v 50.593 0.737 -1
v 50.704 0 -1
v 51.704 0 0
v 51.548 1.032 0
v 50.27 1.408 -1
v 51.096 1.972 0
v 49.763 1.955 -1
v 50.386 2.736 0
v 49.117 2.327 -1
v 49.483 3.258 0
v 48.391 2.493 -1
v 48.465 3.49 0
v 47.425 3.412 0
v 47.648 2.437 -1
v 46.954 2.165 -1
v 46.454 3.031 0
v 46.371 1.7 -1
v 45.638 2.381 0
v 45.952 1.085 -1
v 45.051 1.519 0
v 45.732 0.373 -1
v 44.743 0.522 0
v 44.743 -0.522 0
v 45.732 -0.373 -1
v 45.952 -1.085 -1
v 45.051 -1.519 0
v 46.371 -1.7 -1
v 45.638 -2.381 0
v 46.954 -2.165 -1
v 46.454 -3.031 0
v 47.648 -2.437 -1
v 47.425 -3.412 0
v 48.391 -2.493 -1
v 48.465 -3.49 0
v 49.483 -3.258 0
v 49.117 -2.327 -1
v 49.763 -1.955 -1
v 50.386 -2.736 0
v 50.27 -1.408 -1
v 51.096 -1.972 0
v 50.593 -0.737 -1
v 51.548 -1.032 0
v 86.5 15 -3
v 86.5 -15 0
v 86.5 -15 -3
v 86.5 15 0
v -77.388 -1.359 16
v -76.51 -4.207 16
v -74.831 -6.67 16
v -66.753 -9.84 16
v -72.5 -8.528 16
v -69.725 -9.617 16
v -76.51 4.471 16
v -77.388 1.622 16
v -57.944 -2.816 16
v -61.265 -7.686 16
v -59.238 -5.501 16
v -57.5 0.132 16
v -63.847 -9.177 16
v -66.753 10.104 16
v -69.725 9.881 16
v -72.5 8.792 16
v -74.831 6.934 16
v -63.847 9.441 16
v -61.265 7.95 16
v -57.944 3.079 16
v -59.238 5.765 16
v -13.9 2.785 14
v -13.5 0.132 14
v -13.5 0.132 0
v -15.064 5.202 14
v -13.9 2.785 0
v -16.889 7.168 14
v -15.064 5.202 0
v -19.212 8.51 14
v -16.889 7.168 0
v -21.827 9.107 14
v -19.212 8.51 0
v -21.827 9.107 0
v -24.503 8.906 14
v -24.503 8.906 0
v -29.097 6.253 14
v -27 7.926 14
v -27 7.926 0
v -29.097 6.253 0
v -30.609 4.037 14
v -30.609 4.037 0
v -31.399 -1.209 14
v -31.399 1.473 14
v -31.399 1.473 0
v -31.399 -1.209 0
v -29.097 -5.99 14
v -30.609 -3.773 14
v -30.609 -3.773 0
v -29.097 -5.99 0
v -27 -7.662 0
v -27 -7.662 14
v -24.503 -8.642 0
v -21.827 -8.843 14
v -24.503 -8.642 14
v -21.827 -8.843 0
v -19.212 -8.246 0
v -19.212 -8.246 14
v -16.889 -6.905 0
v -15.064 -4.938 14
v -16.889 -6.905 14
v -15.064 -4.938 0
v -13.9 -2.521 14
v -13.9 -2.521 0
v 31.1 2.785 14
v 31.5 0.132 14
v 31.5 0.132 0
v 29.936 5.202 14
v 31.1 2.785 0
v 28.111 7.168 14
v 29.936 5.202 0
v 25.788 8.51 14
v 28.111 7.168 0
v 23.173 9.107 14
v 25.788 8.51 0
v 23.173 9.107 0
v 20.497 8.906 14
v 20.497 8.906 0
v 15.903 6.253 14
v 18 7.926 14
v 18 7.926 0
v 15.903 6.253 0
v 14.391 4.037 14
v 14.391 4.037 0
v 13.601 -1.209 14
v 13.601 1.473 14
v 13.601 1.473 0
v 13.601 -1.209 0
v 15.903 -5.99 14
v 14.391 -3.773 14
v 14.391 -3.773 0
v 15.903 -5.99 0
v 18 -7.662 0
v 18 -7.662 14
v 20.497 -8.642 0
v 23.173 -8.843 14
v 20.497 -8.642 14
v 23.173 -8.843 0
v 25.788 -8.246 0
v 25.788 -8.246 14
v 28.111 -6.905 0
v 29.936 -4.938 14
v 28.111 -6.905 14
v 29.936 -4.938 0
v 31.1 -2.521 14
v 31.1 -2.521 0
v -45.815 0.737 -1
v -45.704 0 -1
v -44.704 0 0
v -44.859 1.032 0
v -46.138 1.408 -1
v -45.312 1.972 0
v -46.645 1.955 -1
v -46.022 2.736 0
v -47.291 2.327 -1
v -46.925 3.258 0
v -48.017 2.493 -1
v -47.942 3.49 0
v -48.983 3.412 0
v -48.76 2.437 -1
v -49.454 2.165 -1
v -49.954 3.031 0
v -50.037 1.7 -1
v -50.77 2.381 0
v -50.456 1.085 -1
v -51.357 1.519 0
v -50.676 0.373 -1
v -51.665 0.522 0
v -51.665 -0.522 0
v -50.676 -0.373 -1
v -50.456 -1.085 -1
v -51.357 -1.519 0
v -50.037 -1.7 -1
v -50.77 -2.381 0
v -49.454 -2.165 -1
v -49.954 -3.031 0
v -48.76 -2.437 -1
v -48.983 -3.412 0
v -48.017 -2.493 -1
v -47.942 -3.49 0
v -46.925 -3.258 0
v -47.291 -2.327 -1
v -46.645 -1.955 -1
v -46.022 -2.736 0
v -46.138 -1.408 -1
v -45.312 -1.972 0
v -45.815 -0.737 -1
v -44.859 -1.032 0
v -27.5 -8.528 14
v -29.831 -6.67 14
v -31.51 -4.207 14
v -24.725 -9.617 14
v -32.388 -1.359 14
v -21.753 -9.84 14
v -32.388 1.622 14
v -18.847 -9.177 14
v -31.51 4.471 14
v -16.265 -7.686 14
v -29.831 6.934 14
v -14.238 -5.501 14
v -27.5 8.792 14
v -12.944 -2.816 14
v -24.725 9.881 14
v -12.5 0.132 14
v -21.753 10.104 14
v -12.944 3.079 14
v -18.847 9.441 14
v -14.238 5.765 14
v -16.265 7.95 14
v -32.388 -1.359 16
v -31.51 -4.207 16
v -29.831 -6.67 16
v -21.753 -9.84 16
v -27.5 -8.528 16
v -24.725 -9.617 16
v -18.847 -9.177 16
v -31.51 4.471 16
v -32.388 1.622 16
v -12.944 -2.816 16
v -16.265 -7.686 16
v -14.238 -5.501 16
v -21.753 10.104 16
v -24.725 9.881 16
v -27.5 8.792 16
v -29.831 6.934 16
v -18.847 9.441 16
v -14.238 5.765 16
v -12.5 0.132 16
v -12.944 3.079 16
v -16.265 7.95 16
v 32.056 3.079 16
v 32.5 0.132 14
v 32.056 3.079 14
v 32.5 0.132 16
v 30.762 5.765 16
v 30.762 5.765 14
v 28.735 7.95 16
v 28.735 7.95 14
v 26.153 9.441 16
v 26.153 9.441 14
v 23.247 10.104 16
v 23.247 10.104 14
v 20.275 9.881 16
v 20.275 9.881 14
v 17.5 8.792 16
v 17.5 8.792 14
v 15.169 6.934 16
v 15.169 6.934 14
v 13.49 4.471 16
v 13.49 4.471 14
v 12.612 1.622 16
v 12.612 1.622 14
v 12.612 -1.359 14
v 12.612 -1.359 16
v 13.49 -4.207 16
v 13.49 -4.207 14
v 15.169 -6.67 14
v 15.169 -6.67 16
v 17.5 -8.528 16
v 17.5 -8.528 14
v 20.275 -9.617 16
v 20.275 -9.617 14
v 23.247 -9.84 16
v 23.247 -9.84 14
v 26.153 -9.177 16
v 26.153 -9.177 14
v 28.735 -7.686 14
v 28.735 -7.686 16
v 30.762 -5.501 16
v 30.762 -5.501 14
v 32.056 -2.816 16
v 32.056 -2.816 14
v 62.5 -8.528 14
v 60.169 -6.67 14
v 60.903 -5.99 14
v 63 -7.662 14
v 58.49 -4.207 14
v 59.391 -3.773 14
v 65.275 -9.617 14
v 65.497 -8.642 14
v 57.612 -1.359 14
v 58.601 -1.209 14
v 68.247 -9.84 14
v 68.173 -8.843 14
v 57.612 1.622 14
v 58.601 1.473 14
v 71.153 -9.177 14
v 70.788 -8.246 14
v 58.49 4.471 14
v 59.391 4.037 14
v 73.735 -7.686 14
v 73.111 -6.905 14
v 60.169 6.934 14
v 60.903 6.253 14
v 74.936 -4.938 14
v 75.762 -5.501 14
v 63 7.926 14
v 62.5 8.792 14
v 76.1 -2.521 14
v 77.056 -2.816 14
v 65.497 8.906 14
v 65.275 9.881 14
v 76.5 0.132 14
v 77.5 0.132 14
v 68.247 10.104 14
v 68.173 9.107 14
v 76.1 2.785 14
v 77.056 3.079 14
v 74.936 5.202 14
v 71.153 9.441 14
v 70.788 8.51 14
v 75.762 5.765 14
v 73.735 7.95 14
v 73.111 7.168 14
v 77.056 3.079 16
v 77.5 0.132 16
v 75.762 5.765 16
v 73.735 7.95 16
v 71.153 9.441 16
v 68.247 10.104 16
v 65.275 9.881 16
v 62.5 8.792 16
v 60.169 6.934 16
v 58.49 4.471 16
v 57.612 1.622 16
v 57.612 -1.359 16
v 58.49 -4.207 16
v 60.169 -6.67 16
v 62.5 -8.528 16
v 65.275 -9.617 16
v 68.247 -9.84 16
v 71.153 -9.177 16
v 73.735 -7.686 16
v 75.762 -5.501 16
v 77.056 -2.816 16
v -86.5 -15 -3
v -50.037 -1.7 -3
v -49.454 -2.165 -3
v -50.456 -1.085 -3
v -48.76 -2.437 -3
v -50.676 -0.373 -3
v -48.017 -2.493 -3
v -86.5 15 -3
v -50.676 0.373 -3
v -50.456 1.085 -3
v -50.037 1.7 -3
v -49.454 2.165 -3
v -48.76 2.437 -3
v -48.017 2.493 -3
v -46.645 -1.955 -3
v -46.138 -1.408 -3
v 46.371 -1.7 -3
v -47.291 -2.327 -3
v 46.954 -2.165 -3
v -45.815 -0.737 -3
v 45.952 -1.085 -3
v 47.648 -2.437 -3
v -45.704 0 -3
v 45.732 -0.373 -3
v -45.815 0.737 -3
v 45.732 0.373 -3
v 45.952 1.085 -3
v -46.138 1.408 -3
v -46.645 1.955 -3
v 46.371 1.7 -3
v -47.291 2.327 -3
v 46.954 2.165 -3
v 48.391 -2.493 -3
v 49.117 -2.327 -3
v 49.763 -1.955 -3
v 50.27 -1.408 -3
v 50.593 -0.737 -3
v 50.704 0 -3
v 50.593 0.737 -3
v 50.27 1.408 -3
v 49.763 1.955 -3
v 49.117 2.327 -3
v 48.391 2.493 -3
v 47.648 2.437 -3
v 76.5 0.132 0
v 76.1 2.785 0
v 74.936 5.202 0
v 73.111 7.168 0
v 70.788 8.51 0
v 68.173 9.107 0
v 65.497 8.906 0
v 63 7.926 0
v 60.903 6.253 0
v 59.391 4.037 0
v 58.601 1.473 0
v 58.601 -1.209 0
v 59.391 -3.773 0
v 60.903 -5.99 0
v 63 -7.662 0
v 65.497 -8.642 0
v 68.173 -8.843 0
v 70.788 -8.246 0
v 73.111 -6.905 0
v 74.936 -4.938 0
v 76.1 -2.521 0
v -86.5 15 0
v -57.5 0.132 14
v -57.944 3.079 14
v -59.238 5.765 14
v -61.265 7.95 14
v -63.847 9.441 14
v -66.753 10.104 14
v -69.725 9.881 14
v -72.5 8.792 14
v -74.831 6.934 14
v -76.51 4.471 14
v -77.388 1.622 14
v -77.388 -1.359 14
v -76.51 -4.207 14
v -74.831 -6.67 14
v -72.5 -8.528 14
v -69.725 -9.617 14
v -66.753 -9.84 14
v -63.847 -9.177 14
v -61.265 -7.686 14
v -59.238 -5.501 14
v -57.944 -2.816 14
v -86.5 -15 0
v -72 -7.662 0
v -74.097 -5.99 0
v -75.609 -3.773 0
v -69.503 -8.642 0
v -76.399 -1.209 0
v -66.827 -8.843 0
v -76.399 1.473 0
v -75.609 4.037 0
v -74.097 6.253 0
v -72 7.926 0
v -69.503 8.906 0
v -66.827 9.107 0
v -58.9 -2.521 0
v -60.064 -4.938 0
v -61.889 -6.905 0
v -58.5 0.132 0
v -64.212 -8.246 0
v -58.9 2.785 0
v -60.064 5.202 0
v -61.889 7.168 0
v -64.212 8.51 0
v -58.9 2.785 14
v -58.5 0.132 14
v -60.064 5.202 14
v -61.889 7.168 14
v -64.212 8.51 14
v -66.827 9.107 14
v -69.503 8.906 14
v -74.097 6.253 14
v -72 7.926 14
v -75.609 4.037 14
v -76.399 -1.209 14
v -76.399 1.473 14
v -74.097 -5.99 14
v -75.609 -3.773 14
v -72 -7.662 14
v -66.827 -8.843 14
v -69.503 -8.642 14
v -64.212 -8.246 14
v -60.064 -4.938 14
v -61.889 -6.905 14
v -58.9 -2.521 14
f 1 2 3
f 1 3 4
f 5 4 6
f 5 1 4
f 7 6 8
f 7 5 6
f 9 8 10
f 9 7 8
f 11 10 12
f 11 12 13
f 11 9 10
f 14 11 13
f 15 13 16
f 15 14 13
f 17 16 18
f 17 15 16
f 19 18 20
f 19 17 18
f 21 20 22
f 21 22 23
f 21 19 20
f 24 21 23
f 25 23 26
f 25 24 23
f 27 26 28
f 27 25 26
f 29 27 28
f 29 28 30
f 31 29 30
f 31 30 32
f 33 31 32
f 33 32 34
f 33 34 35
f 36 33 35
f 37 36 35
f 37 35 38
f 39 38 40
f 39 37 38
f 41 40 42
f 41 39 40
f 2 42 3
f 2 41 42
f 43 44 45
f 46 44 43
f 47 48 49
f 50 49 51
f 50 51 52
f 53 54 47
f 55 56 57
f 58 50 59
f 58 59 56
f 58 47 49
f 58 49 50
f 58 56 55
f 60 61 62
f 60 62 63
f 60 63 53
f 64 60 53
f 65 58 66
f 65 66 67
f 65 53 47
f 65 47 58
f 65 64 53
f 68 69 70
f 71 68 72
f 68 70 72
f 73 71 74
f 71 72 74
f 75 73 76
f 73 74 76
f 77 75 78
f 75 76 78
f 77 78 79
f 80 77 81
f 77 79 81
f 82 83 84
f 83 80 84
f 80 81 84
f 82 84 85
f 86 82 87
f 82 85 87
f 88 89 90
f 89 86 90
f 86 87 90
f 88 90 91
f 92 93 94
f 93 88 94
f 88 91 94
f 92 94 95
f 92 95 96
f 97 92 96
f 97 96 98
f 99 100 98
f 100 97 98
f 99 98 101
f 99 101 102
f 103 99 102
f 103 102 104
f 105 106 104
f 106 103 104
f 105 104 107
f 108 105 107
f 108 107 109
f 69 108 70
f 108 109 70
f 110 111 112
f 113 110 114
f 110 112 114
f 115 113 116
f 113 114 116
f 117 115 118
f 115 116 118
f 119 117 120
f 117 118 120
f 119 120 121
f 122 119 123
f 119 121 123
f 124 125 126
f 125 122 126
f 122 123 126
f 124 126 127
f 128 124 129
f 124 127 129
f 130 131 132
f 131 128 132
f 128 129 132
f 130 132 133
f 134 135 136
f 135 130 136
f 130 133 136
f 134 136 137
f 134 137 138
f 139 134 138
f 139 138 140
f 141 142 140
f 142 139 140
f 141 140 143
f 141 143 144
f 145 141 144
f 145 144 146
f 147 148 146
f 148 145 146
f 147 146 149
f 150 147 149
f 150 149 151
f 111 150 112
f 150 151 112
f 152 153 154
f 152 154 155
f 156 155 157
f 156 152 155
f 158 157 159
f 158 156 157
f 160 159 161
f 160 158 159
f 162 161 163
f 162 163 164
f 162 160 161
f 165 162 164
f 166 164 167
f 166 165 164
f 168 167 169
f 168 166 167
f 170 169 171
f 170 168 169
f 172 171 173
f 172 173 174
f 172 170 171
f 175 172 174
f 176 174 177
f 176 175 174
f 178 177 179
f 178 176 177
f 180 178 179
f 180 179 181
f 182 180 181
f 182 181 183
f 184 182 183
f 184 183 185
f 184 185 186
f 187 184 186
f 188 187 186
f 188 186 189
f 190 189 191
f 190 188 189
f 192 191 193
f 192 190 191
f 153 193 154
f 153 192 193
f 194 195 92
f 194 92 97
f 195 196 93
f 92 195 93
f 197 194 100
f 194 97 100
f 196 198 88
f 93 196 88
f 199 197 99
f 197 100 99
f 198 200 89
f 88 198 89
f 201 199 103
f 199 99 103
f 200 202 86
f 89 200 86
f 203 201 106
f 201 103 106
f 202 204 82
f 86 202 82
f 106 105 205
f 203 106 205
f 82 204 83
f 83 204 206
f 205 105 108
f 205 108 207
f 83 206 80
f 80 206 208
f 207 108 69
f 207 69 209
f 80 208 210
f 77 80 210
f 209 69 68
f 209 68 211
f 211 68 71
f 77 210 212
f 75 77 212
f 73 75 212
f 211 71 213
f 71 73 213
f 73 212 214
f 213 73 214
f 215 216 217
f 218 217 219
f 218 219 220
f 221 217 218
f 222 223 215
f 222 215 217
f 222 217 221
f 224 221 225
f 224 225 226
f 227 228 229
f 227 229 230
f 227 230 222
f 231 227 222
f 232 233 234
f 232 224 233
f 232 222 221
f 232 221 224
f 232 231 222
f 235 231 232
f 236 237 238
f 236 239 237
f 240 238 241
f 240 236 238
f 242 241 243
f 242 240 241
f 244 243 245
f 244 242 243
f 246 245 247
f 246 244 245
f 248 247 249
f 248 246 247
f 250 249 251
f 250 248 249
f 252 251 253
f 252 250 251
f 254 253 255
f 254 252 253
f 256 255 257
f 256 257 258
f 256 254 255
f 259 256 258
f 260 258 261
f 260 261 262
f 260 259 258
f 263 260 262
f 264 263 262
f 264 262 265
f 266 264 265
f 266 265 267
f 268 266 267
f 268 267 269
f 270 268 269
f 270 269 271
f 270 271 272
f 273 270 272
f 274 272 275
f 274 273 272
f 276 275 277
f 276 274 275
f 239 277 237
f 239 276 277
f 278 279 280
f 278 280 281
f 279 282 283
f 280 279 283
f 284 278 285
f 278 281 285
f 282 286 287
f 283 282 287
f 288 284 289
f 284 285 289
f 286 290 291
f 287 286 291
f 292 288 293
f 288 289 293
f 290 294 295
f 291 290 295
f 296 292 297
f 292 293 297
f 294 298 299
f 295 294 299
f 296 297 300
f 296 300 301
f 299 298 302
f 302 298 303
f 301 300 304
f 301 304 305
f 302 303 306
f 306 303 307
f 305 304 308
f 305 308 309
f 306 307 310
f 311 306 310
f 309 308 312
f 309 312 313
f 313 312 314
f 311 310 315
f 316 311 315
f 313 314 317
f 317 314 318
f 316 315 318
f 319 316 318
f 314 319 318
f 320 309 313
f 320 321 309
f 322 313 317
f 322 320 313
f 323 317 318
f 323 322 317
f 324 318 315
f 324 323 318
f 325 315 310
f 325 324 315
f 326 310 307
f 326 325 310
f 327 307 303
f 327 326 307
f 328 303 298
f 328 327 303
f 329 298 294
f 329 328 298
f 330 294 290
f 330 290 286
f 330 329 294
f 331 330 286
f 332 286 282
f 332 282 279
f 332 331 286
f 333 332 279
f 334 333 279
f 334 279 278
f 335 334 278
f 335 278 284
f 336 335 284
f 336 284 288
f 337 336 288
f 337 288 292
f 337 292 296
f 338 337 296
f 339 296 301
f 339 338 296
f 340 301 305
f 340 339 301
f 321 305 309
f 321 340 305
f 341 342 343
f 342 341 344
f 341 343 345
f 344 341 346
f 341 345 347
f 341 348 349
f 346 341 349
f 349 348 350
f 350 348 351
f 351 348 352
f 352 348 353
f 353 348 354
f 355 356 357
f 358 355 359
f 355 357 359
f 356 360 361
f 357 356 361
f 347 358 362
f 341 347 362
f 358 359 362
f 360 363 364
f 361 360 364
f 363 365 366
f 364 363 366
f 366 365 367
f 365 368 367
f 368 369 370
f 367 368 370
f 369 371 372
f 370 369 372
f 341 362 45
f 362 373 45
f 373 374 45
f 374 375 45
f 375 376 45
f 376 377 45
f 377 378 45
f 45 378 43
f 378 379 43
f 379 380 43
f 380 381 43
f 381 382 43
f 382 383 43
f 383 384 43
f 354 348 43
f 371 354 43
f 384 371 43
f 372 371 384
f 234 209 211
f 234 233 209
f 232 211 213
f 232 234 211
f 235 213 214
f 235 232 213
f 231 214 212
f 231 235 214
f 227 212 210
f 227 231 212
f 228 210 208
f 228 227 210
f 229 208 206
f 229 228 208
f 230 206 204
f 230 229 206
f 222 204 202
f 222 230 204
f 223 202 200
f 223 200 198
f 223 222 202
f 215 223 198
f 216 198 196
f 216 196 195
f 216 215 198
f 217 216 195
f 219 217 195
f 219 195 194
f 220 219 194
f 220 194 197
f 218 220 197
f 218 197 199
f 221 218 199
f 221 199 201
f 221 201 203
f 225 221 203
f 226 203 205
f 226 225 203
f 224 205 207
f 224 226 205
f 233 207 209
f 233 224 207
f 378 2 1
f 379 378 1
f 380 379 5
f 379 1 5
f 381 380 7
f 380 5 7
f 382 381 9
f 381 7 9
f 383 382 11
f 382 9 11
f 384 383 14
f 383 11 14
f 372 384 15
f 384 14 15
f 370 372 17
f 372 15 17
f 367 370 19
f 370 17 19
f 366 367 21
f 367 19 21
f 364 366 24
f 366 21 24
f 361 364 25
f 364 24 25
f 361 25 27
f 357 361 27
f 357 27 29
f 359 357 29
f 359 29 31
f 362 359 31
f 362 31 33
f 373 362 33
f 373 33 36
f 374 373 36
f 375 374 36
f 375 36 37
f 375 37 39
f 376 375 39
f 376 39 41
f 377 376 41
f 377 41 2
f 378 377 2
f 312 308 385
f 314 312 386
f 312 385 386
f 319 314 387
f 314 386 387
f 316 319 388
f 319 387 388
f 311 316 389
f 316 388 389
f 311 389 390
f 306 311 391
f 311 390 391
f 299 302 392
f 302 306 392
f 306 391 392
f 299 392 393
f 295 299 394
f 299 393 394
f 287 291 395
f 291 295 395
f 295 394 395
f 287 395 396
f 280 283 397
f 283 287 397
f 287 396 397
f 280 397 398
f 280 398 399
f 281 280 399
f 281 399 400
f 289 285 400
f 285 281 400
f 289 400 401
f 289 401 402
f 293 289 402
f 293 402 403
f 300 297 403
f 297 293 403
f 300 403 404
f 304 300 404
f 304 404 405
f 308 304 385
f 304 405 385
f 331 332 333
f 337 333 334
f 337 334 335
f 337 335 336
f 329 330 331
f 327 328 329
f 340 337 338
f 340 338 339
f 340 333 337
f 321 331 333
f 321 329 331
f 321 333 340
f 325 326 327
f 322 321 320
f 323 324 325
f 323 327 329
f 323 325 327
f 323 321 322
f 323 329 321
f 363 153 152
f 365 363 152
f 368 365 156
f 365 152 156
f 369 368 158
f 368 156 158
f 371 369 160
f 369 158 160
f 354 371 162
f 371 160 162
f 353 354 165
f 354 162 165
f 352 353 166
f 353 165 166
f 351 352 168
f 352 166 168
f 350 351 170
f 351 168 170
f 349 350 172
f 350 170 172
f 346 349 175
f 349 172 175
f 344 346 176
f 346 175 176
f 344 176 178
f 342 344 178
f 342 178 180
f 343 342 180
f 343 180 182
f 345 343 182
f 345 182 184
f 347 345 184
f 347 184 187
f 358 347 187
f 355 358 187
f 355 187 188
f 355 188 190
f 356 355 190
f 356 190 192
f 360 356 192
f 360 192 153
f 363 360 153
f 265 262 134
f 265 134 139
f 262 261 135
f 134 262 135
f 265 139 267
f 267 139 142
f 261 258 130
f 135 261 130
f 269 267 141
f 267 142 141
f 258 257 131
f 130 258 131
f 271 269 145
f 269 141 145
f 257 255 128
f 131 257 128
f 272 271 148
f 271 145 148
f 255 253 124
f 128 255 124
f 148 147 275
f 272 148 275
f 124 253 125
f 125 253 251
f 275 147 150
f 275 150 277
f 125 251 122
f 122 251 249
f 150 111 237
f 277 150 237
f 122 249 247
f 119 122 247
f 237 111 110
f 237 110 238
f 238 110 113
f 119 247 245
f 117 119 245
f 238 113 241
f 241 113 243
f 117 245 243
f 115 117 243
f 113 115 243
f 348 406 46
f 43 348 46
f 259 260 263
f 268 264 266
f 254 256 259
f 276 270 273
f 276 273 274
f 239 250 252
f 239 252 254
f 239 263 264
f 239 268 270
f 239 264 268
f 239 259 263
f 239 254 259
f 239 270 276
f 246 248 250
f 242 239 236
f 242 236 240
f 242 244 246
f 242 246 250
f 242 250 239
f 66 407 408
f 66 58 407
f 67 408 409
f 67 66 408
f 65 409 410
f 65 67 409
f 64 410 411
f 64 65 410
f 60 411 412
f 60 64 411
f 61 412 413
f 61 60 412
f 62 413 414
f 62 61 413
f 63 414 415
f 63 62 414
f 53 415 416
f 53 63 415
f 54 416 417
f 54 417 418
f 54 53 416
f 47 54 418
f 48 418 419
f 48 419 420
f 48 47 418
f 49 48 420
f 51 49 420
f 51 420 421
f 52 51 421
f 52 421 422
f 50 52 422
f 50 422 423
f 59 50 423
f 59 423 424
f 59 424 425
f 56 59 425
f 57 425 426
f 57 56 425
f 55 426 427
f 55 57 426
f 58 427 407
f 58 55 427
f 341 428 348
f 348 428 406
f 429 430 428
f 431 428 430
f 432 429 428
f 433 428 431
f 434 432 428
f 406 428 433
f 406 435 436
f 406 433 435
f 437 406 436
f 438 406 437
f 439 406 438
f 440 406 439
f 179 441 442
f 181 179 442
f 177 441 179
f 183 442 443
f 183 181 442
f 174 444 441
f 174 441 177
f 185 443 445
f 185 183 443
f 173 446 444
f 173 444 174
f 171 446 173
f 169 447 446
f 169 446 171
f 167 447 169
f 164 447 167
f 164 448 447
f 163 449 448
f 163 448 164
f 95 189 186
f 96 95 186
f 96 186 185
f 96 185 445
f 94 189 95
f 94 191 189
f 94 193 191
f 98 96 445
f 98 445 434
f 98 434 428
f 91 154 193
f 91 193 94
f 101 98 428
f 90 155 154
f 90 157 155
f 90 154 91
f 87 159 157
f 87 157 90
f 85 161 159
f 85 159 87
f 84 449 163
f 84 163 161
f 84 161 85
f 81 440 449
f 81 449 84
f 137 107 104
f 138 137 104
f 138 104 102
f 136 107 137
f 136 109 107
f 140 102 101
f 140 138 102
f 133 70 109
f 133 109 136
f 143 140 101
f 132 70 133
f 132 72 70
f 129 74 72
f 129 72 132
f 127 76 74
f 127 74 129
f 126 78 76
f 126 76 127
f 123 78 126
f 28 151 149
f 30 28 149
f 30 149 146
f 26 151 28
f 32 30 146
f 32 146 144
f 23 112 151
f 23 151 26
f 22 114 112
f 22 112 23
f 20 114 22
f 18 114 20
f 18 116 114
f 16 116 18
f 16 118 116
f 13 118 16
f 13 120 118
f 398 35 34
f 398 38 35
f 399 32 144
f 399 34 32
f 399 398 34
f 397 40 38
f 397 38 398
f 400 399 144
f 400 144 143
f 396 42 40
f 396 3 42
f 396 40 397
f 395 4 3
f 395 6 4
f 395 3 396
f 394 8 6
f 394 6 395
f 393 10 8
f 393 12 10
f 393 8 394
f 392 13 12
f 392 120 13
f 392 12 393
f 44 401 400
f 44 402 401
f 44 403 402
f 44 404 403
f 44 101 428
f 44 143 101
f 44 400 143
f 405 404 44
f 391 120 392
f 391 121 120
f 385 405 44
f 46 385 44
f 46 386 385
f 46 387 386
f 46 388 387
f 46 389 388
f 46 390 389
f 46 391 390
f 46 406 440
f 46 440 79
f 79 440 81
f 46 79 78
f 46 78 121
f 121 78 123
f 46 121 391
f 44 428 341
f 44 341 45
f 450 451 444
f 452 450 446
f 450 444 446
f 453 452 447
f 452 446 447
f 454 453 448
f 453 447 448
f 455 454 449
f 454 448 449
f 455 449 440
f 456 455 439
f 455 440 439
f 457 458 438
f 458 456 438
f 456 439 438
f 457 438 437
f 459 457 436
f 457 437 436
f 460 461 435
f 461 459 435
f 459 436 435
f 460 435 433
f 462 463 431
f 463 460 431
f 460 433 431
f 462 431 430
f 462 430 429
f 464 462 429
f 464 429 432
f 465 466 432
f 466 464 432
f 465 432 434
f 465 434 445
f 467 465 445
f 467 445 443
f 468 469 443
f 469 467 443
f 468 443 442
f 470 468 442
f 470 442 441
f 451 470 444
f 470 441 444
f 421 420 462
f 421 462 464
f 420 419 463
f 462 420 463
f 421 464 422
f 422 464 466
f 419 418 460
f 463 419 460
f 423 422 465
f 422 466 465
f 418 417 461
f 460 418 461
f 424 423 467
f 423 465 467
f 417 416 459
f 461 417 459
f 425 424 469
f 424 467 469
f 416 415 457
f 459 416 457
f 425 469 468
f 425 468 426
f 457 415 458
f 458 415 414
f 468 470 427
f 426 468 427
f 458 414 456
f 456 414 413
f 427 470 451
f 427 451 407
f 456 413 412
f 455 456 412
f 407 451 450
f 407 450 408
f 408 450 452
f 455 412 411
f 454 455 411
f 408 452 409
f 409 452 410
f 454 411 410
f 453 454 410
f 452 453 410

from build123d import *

# Parameters (mm, degrees)
F0_W     = 173
F0_H     = 30
F1_DEPTH = 3
F2_R     = 9
F3_DEPTH = 15
F4_R     = 2.5
F5_DEPTH = 25
F6_SIZE  = 1
F7_R     = 10
F7_R_2   = 9
F8_DEPTH = 1


with BuildPart() as f1:
    # F0 (on Top) → F1 (new body)
    with BuildSketch(Plane.XY):
        Rectangle(F0_W, F0_H)
    extrude(amount=-F1_DEPTH)

    # F2 (on face) → F3 (join)
    with BuildSketch(Plane.XY):
        with Locations((-67.5, 0.1318904841)):
            Circle(F2_R)
        with Locations((-22.5, 0.1318904841)):
            Circle(F2_R)
        with Locations((22.5, 0.1318904841)):
            Circle(F2_R)
        with Locations((67.5, 0.1318904841)):
            Circle(F2_R)
    extrude(amount=F3_DEPTH)

    # F4 (on face) → F5 (cut)
    with BuildSketch(Plane.XY):
        with Locations((-48.203933984, 0)):
            Circle(F4_R)
        with Locations((48.203933984, 0)):
            Circle(F4_R)
    extrude(amount=-F5_DEPTH, mode=Mode.SUBTRACT)

    # F6
    f6_edges = [f1.edges().sort_by_distance(p)[0] for p in [
        (-50.703934, 0, 0),
        (45.703934, 0, 0),
    ]]
    chamfer(f6_edges, length=F6_SIZE)

    # F7 (on face) → F8 (join, symmetric)
    with BuildSketch(Plane.XY.offset(15)):
        with Locations((-67.5, 0.1318904841)):
            Circle(F7_R)
        with Locations((-67.5, 0.1318904841)):
            Circle(F7_R_2, mode=Mode.SUBTRACT)
        with Locations((-22.5, 0.1318904841)):
            Circle(F7_R)
        with Locations((22.5, 0.1318904841)):
            Circle(F7_R)
        with Locations((67.5, 0.1318904841)):
            Circle(F7_R)
        with Locations((-67.5, 0.1318904841)):
            Circle(F7_R_2)
    extrude(amount=F8_DEPTH, both=True)


solid = f1.part
